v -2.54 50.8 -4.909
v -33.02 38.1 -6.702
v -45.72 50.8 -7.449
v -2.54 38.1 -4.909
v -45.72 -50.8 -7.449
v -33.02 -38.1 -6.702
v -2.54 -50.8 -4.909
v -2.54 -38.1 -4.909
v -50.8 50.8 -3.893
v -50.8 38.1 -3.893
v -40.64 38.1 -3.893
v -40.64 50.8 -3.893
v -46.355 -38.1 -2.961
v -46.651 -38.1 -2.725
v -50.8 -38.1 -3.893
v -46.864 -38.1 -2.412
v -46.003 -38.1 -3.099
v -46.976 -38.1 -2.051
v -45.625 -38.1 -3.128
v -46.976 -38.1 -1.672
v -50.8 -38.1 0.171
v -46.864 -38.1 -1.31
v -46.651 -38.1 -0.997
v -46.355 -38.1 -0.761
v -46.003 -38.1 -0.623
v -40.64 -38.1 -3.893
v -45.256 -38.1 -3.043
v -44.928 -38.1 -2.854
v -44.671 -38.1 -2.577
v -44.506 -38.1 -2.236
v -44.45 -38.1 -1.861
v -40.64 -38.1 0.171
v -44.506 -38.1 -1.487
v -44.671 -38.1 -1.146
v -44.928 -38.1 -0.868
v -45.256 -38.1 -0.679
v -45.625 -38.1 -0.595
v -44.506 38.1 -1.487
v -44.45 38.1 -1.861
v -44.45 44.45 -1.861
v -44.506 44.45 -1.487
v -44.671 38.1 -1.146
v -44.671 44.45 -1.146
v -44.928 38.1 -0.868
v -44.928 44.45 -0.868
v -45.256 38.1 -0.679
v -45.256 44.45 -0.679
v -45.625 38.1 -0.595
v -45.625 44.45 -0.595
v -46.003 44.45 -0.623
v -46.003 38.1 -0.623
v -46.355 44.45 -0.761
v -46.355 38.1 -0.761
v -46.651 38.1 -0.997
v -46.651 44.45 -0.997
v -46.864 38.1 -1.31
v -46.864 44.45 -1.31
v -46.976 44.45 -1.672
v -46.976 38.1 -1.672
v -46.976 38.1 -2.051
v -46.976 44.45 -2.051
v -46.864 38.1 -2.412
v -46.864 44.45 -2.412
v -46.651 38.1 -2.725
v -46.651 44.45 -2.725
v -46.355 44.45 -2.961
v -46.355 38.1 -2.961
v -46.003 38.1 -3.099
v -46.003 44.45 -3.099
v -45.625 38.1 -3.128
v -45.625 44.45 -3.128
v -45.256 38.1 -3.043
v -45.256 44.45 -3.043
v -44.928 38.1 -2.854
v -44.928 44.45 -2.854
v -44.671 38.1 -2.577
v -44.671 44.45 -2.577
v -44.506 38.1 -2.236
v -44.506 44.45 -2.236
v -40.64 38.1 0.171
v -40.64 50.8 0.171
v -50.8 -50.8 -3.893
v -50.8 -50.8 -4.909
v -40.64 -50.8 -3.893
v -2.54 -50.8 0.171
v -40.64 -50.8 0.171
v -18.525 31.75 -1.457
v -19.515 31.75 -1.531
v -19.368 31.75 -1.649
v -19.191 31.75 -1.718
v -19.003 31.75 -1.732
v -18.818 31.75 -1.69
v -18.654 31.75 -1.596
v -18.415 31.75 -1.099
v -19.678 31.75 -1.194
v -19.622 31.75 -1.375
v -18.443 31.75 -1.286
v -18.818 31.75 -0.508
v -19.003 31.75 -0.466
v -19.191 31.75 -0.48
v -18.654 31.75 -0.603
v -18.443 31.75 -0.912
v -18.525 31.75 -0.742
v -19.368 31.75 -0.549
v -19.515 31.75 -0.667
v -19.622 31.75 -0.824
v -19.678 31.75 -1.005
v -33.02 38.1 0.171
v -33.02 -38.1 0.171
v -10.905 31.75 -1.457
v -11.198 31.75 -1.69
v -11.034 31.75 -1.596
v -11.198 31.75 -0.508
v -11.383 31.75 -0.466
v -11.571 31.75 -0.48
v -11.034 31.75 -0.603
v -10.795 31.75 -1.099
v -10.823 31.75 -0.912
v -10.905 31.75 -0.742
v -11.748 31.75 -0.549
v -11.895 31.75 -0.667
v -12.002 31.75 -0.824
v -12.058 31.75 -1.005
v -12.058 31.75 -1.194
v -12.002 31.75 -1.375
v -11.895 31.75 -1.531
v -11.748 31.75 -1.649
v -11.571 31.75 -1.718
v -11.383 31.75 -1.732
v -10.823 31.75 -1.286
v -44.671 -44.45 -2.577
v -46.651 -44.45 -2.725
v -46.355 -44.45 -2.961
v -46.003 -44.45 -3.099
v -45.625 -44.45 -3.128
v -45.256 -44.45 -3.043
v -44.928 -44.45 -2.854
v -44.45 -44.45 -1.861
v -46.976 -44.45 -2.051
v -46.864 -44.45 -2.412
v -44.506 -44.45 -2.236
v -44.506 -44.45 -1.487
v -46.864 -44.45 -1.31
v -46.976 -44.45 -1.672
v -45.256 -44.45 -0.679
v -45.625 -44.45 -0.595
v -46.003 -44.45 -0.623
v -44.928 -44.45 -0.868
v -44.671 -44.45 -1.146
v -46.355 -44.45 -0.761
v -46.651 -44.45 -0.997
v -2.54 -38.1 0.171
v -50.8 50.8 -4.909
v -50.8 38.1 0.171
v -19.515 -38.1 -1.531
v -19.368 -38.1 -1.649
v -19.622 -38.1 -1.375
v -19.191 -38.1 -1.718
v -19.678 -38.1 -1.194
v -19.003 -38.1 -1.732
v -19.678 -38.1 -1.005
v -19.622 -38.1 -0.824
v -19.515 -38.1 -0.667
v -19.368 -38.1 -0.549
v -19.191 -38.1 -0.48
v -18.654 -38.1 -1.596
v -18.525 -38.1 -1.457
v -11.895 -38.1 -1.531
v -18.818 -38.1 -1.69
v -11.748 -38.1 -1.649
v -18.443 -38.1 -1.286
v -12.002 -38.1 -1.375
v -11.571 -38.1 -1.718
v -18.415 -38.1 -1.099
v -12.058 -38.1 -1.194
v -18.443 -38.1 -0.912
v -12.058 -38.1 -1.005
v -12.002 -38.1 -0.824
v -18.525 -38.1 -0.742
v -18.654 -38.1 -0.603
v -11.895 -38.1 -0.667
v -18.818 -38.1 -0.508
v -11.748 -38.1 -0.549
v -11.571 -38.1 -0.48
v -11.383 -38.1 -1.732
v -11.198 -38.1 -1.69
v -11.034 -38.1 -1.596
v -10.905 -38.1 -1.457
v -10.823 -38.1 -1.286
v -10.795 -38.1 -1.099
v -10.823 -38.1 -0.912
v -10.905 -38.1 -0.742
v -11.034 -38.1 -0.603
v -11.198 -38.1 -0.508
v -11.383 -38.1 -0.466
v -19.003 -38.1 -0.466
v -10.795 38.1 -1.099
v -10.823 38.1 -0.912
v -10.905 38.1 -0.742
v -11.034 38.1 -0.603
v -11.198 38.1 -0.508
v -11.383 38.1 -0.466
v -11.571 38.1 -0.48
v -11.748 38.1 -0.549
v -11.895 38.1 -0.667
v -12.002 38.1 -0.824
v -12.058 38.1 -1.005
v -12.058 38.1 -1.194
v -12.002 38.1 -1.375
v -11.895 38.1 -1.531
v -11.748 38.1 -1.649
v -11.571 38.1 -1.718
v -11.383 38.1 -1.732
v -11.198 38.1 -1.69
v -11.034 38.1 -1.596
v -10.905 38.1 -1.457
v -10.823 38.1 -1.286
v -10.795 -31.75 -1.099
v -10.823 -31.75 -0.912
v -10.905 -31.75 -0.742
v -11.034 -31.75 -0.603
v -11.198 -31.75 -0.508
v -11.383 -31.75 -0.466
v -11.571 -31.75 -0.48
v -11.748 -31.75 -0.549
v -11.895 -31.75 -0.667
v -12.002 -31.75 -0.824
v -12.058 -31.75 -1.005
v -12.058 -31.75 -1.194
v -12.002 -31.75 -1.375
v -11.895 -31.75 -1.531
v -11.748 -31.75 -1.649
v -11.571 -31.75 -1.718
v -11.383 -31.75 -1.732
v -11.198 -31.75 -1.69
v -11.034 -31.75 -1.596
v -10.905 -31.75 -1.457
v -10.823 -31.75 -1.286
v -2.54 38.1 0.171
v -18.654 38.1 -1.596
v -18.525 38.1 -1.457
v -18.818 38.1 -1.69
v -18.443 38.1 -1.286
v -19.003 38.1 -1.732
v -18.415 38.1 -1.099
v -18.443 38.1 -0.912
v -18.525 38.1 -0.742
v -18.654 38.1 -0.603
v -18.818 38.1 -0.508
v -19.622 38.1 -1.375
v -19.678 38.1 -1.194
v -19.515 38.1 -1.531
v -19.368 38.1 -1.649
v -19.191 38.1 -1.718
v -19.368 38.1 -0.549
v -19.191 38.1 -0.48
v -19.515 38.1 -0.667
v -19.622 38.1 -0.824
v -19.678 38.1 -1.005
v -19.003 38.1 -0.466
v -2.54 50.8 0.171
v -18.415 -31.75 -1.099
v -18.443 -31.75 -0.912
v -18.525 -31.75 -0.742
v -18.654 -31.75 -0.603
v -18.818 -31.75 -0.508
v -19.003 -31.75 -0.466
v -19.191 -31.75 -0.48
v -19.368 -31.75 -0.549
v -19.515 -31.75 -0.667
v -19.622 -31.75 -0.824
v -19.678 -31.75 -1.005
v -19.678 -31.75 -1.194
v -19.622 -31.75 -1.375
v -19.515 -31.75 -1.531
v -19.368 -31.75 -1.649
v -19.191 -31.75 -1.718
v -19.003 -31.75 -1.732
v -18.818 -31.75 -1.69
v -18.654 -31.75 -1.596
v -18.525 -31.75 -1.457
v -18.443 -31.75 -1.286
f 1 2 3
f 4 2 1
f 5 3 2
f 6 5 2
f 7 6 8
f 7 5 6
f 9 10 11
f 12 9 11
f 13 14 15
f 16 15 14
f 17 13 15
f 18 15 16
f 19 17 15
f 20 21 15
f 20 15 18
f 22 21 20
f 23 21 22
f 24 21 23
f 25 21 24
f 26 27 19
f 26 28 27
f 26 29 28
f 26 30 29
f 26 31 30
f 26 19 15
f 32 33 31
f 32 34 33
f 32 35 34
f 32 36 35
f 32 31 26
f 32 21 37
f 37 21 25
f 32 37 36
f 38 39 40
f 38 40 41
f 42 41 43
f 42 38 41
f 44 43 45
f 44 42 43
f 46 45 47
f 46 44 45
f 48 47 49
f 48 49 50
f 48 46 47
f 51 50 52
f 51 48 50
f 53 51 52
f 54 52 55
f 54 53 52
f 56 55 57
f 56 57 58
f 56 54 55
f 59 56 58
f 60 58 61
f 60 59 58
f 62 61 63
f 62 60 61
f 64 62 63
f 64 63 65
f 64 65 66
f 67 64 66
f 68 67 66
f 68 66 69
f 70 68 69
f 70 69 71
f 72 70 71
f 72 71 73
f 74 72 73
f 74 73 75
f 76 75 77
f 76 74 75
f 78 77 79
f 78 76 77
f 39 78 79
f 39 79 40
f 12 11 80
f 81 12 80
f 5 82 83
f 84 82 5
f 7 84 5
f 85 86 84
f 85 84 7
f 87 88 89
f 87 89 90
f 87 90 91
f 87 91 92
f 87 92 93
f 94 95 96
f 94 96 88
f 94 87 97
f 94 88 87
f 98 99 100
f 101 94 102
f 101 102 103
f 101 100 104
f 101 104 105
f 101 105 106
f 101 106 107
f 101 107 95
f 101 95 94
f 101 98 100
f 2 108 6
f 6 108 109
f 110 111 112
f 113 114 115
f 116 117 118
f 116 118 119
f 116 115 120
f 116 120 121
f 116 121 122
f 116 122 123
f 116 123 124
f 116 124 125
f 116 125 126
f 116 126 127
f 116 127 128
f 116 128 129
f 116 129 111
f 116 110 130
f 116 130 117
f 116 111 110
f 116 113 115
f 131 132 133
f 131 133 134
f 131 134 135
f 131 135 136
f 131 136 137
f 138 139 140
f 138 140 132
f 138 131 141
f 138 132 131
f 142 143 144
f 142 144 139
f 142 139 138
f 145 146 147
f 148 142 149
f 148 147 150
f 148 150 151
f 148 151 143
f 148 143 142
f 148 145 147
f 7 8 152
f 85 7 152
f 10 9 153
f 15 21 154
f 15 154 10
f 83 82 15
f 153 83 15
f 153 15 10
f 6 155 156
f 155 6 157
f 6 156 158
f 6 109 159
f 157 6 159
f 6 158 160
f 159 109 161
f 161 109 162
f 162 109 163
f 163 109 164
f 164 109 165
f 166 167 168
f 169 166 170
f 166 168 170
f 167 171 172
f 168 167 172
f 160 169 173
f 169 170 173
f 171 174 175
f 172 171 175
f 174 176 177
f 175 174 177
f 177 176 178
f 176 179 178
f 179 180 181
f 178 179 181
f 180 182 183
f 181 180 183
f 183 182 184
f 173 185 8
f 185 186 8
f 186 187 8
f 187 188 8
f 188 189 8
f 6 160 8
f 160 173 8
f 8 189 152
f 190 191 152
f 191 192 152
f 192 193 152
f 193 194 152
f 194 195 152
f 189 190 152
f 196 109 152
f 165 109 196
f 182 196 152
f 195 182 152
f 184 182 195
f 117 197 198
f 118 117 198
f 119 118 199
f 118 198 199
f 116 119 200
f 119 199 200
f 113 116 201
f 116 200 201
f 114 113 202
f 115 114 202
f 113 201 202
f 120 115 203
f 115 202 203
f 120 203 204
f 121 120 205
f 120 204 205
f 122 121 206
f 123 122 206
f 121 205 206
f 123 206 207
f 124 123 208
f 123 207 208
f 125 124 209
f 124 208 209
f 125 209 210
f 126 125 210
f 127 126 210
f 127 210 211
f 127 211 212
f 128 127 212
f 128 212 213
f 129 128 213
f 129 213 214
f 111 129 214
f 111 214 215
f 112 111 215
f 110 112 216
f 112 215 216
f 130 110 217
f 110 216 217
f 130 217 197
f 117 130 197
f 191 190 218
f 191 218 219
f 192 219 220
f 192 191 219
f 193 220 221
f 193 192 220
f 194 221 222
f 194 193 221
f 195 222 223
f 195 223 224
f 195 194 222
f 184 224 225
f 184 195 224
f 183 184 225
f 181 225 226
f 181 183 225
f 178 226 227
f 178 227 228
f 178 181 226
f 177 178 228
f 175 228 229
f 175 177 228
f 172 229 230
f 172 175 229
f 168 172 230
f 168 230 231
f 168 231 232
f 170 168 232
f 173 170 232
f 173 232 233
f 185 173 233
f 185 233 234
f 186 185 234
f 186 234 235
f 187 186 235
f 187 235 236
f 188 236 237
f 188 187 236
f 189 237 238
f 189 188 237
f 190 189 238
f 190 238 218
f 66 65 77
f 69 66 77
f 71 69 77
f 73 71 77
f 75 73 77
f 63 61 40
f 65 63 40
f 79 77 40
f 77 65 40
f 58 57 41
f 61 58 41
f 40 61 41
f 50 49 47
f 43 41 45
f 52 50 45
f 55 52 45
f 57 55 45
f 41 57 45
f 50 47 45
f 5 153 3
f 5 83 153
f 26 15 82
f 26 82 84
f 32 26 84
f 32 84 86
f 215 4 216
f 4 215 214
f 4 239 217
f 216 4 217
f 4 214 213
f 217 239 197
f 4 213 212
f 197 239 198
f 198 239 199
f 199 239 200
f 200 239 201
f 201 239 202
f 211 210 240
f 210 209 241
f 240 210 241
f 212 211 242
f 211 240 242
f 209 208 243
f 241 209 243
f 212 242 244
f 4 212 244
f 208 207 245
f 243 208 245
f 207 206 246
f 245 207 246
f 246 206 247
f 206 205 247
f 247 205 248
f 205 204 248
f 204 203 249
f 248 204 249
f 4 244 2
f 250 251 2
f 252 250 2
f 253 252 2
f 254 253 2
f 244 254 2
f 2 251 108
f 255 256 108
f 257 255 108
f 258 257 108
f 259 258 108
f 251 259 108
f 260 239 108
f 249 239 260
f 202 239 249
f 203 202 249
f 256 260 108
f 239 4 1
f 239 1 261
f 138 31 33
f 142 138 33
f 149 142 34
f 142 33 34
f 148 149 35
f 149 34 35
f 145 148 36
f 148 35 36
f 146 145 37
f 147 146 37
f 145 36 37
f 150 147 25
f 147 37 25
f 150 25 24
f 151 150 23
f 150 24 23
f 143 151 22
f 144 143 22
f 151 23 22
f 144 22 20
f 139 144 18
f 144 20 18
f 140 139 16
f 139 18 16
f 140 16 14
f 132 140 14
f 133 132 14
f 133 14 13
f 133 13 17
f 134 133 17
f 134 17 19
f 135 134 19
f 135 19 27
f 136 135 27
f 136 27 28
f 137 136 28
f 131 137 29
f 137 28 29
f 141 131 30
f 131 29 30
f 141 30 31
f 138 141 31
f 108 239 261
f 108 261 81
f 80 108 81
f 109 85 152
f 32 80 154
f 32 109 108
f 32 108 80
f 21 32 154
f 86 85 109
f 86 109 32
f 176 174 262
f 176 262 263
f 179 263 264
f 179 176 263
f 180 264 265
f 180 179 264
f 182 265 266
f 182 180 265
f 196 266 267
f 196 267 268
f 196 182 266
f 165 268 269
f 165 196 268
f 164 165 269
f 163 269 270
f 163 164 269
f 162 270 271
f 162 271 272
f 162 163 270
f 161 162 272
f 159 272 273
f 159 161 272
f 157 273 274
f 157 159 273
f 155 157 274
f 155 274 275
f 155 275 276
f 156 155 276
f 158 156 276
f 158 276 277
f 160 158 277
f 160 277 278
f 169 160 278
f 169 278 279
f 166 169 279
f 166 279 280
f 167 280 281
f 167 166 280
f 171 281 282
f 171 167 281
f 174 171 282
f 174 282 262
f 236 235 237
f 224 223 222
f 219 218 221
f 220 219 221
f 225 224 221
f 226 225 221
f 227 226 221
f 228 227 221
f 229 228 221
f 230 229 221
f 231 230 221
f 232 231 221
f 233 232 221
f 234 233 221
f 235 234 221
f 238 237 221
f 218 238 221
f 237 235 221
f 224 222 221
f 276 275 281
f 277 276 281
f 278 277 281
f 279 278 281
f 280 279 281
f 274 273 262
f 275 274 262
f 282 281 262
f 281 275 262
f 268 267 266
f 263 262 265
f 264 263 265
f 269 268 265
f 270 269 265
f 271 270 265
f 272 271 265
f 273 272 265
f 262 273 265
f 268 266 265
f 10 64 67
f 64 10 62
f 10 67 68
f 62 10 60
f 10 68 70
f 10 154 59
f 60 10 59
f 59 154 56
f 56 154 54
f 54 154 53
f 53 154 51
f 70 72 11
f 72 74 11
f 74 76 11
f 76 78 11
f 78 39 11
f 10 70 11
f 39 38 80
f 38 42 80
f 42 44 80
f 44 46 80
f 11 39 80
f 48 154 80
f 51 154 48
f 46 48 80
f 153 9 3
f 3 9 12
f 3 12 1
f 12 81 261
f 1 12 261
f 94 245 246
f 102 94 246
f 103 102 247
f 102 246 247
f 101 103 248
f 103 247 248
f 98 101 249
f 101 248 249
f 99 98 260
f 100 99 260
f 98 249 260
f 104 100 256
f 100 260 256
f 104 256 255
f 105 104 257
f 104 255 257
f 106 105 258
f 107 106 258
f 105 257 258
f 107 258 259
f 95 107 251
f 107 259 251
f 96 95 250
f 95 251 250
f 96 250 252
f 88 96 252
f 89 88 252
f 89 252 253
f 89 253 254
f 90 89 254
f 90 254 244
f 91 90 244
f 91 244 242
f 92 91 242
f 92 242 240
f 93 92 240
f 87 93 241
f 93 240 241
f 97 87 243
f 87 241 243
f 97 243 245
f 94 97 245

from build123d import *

# Parameters (mm, degrees)
F1_DEPTH = 50.8
F3_DEPTH = 7.621
F4_W     = 10.16
F4_H     = 4.064
F5_DEPTH = 12.7
F6_R     = 1.27
F7_DEPTH = 6.35
F8_R     = 0.635
F9_DEPTH = 6.35


# Not quite as in the source:
# - a pattern or mirror of a feature is missing from the dataset's text; its kind, count and spacing are read off the source's solid


with BuildPart() as f1:
    # F0 (on Front) → F1 (new body, symmetric)
    with BuildSketch(Plane.XZ):
        Polygon((-2.54, -4.9092677324), (-2.54, 0.1707322676), (-50.8, 0.1707322676), (-50.8, -4.9092677324), (-45.72, -7.4492677324), align=None)
    extrude(amount=F1_DEPTH, both=True)

    # F2 (on face) → F3 (cut, through all)
    with BuildSketch(Plane.XY.offset(0.1707322676)):
        Polygon((-2.54, 0), (-2.54, 38.1), (-33.02, 38.1), (-33.02, 0), (-33.02, -38.1), (-2.54, -38.1), align=None)
    extrude(amount=-F3_DEPTH, mode=Mode.SUBTRACT)

    # F4 (on face) → F5 (cut)
    with BuildSketch(Plane.XZ.offset(50.8)):
        with Locations((-45.72, -1.8612677324)):
            Rectangle(F4_W, F4_H)
    f5 = extrude(amount=-F5_DEPTH, mode=Mode.SUBTRACT)

    # F5_copies: F5 across plane
    add(f5.mirror(Plane.ZX), mode=Mode.SUBTRACT)

    # F6 (on face) → F7 (join)
    with BuildSketch(Plane.XZ.offset(38.1)):
        with Locations((-45.72, -1.8612677324)):
            Circle(F6_R)
    f7 = extrude(amount=F7_DEPTH)

    # F7_copies: F7 across plane
    add(f7.mirror(Plane.ZX))

    # F8 (on face) → F9 (join)
    with BuildSketch(Plane.XZ.offset(-38.1)):
        with Locations((-19.05, -1.0992677324)):
            Circle(F8_R)
        with Locations((-11.43, -1.0992677324)):
            Circle(F8_R)
    f9 = extrude(amount=F9_DEPTH)

    # F9_copies: F9 across plane
    add(f9.mirror(Plane(origin=(0, 0, 0), x_dir=(0, 0, -1), z_dir=(0, -1, 0))))


solid = f1.part
